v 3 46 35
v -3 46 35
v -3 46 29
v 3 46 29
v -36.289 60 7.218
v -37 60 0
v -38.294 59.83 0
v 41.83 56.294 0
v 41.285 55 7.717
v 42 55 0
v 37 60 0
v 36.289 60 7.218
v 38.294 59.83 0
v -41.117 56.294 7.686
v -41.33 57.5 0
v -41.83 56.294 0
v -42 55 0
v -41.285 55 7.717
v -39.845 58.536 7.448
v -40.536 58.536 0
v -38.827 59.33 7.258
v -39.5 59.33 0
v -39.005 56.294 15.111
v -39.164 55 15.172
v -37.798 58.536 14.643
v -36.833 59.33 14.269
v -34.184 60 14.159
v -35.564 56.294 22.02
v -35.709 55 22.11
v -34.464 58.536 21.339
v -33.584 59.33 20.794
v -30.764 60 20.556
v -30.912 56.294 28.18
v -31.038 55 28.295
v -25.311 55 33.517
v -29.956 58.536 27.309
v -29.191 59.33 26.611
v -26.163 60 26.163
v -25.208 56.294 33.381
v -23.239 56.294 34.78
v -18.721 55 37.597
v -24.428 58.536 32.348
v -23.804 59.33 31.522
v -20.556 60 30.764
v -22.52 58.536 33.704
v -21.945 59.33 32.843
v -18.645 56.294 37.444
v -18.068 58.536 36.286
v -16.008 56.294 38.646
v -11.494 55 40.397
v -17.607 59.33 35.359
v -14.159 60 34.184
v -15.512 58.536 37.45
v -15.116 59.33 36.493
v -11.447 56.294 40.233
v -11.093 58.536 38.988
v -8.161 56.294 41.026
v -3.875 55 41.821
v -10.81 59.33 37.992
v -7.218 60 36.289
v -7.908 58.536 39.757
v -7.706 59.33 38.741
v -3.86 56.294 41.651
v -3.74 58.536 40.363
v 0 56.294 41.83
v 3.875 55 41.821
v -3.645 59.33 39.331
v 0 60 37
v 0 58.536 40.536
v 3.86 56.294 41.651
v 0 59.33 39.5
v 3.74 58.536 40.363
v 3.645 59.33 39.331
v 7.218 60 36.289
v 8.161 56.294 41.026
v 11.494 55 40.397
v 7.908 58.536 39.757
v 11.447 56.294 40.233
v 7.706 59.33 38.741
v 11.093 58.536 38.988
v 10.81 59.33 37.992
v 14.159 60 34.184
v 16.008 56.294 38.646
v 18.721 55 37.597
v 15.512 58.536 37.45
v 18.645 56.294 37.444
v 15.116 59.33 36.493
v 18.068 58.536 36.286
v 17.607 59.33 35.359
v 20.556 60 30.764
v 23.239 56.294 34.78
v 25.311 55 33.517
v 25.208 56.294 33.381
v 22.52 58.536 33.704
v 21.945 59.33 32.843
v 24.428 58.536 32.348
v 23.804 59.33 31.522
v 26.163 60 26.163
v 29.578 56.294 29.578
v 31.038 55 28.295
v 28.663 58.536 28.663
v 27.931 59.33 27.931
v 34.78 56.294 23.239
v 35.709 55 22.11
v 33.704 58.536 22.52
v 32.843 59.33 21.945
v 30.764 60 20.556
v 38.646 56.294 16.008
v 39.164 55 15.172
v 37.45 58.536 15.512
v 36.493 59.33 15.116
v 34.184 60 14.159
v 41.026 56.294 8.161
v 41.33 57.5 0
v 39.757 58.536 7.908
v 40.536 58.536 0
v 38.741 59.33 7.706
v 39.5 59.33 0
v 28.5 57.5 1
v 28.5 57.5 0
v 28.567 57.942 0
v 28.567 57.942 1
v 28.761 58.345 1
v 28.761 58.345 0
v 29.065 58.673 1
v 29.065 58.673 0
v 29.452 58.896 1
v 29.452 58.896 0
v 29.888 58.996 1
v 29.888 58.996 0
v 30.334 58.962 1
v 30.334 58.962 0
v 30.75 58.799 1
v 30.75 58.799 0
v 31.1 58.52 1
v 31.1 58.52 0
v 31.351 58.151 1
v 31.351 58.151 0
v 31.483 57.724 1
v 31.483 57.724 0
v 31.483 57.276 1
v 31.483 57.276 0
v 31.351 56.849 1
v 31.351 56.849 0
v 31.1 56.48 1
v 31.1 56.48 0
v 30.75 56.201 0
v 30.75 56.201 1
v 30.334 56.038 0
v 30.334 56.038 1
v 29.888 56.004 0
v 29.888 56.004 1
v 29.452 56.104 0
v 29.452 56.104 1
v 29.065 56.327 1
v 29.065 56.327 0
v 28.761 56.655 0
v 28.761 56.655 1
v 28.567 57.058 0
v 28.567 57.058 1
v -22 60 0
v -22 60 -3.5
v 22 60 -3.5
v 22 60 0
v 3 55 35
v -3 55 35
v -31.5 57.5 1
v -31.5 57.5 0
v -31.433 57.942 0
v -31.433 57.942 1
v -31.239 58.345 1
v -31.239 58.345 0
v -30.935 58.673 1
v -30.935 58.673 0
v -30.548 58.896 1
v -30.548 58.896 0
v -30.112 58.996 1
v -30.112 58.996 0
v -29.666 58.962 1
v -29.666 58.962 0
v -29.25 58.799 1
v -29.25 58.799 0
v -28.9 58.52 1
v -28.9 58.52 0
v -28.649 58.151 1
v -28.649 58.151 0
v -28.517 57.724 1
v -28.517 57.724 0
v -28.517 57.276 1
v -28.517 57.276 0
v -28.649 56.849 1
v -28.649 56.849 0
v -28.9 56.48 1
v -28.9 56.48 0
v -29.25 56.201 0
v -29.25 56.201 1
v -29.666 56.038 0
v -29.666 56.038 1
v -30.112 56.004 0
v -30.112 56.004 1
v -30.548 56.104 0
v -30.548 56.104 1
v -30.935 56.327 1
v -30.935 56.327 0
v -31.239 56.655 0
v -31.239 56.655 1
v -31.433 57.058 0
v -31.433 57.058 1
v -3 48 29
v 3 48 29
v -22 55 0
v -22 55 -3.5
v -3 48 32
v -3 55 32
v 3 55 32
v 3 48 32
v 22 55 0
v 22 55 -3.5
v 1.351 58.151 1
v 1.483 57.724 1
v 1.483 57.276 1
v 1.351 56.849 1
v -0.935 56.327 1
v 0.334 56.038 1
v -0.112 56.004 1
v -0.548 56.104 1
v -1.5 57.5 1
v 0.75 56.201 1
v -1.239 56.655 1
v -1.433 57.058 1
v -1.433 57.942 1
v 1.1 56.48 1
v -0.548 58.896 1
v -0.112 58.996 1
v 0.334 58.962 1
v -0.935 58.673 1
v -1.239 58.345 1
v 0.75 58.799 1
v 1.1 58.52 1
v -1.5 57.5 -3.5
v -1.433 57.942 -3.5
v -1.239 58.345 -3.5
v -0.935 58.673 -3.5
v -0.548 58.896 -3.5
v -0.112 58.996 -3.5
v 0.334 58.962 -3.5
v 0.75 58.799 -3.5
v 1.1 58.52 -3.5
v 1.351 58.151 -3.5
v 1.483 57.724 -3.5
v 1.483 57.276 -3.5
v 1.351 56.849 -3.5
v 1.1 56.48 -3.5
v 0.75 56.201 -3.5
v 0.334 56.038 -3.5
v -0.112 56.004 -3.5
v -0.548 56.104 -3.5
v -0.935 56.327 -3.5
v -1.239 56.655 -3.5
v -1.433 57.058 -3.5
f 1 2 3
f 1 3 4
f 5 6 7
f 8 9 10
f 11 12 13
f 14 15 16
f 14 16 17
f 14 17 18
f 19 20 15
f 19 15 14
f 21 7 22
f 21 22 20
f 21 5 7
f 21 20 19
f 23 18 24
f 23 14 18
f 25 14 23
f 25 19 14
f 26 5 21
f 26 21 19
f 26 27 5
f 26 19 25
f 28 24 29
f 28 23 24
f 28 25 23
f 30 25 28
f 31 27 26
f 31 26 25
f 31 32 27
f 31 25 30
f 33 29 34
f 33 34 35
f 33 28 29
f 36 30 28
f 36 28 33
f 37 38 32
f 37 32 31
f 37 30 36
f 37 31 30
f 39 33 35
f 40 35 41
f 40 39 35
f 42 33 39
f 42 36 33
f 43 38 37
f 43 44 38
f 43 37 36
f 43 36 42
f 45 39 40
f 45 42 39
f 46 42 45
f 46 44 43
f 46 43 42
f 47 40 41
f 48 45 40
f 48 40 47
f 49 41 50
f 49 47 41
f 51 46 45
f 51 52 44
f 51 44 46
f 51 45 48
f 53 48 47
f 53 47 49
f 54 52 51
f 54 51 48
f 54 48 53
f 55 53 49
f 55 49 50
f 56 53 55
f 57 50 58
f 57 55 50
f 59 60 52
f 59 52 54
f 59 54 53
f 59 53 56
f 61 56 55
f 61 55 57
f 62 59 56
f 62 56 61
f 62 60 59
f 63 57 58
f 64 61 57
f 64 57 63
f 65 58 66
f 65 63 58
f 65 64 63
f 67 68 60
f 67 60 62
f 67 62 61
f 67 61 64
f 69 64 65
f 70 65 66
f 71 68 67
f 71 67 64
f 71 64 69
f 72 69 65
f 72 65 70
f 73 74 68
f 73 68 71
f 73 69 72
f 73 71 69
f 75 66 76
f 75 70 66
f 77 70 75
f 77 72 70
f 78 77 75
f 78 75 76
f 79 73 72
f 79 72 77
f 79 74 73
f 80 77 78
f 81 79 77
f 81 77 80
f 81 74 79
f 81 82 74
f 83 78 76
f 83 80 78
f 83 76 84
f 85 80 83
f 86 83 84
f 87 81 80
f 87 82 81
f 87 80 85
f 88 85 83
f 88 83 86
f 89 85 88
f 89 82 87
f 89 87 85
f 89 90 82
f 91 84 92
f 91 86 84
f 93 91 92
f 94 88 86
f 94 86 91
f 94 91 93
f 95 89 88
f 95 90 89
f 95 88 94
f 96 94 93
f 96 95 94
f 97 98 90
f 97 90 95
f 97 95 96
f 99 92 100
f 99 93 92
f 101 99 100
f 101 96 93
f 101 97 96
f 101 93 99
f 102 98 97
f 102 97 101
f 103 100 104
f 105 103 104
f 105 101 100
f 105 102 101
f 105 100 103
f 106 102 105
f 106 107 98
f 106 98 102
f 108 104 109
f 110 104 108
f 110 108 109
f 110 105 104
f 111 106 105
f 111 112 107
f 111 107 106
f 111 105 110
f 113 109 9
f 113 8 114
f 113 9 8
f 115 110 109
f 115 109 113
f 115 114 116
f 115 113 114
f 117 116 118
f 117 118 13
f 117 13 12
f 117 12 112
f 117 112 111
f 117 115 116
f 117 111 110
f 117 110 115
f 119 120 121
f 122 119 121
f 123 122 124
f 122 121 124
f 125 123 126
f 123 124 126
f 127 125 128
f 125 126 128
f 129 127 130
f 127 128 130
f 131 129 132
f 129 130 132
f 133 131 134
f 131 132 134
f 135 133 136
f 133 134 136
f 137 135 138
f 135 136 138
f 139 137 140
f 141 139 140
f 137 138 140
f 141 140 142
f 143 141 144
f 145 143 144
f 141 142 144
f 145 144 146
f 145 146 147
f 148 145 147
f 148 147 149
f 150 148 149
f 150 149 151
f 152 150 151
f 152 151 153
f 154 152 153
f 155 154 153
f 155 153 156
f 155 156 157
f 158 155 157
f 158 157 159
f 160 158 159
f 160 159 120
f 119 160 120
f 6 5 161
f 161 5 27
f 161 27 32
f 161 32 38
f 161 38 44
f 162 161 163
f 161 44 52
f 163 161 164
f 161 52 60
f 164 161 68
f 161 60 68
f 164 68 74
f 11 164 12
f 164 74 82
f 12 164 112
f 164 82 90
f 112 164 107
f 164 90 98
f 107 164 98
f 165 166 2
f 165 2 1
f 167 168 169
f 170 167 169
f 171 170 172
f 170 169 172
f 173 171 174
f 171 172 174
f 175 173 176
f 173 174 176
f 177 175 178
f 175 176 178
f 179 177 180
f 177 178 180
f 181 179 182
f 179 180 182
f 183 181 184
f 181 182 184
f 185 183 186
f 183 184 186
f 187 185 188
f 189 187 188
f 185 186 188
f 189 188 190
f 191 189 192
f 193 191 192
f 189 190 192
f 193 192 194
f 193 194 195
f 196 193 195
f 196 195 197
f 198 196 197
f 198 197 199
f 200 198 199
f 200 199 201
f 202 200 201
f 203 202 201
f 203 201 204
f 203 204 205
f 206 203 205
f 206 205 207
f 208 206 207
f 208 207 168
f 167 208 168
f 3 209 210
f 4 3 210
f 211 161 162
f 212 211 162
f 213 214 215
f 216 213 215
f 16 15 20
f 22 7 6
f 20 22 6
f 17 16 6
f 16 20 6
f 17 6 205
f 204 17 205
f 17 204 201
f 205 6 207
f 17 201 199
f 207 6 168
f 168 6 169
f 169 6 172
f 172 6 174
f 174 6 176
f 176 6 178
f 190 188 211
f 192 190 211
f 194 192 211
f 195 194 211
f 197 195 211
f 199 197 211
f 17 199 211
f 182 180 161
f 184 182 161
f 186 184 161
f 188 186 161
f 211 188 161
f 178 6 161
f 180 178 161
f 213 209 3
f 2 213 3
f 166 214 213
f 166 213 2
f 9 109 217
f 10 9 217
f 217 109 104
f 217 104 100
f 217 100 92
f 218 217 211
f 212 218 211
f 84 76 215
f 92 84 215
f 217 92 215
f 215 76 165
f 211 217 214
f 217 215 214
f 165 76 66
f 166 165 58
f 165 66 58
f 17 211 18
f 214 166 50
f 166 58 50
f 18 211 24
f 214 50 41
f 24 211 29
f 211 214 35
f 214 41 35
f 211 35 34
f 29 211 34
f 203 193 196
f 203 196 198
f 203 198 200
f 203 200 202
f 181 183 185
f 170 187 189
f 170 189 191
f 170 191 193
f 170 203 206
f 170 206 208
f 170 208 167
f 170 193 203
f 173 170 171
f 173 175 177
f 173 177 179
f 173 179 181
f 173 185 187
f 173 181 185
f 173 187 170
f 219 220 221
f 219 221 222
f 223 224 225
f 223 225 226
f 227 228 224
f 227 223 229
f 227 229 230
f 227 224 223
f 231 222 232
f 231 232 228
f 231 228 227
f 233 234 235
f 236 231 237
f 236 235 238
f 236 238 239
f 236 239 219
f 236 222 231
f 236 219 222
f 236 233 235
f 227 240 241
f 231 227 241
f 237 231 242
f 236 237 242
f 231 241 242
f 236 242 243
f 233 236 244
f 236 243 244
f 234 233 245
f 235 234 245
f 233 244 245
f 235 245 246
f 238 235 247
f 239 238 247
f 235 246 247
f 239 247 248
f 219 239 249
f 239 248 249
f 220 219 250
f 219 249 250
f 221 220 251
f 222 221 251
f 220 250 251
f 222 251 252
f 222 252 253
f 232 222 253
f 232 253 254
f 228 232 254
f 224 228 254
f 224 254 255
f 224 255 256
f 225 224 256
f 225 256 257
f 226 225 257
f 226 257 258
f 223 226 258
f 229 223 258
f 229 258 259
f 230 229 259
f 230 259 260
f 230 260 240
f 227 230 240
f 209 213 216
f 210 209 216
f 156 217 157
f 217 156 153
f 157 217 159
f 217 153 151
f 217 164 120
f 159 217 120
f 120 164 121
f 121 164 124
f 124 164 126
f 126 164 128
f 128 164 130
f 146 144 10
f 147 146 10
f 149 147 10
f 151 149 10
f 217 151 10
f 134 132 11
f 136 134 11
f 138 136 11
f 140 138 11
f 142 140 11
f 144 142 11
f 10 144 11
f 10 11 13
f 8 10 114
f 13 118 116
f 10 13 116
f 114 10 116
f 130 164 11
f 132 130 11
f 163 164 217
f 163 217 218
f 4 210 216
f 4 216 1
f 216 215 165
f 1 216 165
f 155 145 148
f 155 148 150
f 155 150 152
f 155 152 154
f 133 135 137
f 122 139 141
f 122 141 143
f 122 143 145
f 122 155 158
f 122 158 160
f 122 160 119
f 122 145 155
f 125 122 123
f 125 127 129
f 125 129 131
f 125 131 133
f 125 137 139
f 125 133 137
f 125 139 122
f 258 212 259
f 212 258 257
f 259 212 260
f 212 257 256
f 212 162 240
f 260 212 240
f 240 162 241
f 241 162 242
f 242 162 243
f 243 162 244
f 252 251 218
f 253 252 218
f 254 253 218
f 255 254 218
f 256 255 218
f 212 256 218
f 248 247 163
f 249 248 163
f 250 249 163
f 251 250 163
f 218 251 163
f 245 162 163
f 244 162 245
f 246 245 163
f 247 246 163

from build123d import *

# Parameters (mm, degrees)
CUT_EXTRUDE1_DEPTH       = 5
CUT_EXTRUDE3_DEPTH       = 45
SKETCH8_R                = 40
CUT_EXTRUDE4_DEPTH       = 32
SKETCH9_R                = 32
SKETCH9_R_2              = 24.5
CUT_EXTRUDE5_DEPTH       = 14
SKETCH10_R               = 26
CUT_EXTRUDE6_DEPTH       = 14
FILLET1_R                = 7
FILLET2_R                = 7
CUT_REVOLVE1_START       = 22
CUT_REVOLVE1_DEPTH       = 30.5
CUT_EXTRUDE12_DEPTH      = 5
SKETCH18_W               = 13
SKETCH18_H               = 8
CUT_EXTRUDE13_DEPTH      = 5
INTERSECT1_OUTLINE_R     = 42
INTERSECT1_DEPTH         = 55
SKETCH20_W               = 6
SKETCH20_H               = 3
BOSS_EXTRUDE1_DEPTH      = 8
BOSS_EXTRUDE2_DEPTH      = 1
BOSS_EXTRUDE2_DEPTH_BACK = 1
SKETCH21_W               = 6
SKETCH21_H               = 6
BOSS_EXTRUDE3_DEPTH      = 7
SKETCH19_R               = 1.5
CUT_EXTRUDE14_DEPTH      = 8
SKETCH23_W               = 20
SKETCH23_H               = 7
CUT_EXTRUDE15_DEPTH      = 7
SKETCH24_W               = 44
SKETCH24_H               = 3.5
CUT_EXTRUDE16_DEPTH      = 5


# Read off the part's stored shape, not the designer's step: Cut-Revolve1, Intersect1
with BuildPart() as part:
    # Sketch1 → Revolve1 (revolve)
    with BuildSketch(Plane.XY, mode=Mode.PRIVATE) as revolve1_sk:
        with BuildLine():
            Line((22.5, 0), (32, 0))
            ThreePointArc((32, 0), (33.414213562, 0.585786438), (34, 2))
            Line((34, 2), (34, 18))
            Line((34, 18), (40, 18))
            ThreePointArc((40, 18), (41.414213562, 18.585786438), (42, 20))
            Line((42, 20), (42, 55))
            ThreePointArc((42, 55), (40.535533906, 58.535533906), (37, 60))
            Line((37, 60), (0, 60))
            Line((0, 60), (0, 18))
            Line((0, 18), (22.5, 18))
            Line((22.5, 18), (22.5, 0))
        make_face()
    revolve(revolve1_sk.sketch.rotate(Axis((0, 2, 0), (0, 1, 0)), 90), axis=Axis((0, 2, 0), (0, 1, 0)))

    # Sketch5 → Cut-Extrude1 (cut)
    with BuildSketch(Plane(origin=(0, 60, 0), x_dir=(1, 0, 0), z_dir=(0, 1, 0))):
        with BuildLine():
            Line((-42, 0), (-40, 0))
            Line((-40, 0), (40, 0))
            Line((40, 0), (42, 0))
            ThreePointArc((42, 0), (0, 42), (-42, 0))
        make_face()
    extrude(amount=-CUT_EXTRUDE1_DEPTH, mode=Mode.SUBTRACT)

    # Sketch7 → Cut-Extrude3 (cut)
    with BuildSketch(Plane.XZ.offset(-18)):
        with BuildLine():
            Line((-21, 0), (21, 0))
            ThreePointArc((21, 0), (0, -21), (-21, 0))
        make_face()
    extrude(amount=-CUT_EXTRUDE3_DEPTH, mode=Mode.SUBTRACT)

    # Sketch8 → Cut-Extrude4 (cut)
    with BuildSketch(Plane(origin=(0, 52.5, 0), x_dir=(1, 0, 0), z_dir=(0, 1, 0))):
        with Locations(Location((0, 0, 0), (0, 0, 270))):
            Circle(SKETCH8_R)
        with BuildLine():
            Line((22.912878475, -2), (-22.912878475, -2))
            ThreePointArc((-22.912878475, -2), (0, 23), (22.912878475, -2))
        make_face(mode=Mode.SUBTRACT)
    extrude(amount=-CUT_EXTRUDE4_DEPTH, mode=Mode.SUBTRACT)

    # Sketch9 → Cut-Extrude5 (cut)
    with BuildSketch(Plane(origin=(0, 2, 0), x_dir=(-1, 0, 0), z_dir=(0, -1, 0))):
        with Locations(Location((0, 0, 0), (0, 0, 90))):
            Circle(SKETCH9_R)
        with Locations(Location((0, 0, 0), (0, 0, 90))):
            Circle(SKETCH9_R_2, mode=Mode.SUBTRACT)
    extrude(amount=-CUT_EXTRUDE5_DEPTH, mode=Mode.SUBTRACT)

    # Sketch10 → Cut-Extrude6 (cut)
    with BuildSketch(Plane(origin=(0, 2, 0), x_dir=(-1, 0, 0), z_dir=(0, -1, 0))):
        Circle(SKETCH10_R)
    extrude(amount=-CUT_EXTRUDE6_DEPTH, mode=Mode.SUBTRACT)

    # Fillet1
    fillet1_edges = [part.edges().sort_by_distance(p)[0] for p in [
        (21, 36.5, 0),
        (-21, 36.5, 0),
    ]]
    fillet(fillet1_edges, radius=FILLET1_R)

    # Fillet2
    fillet2_edges = [part.edges().sort_by_distance(p)[0] for p in [
        (-22.912878475, 36.5, 2),
        (22.912878475, 36.5, 2),
    ]]
    fillet(fillet2_edges, radius=FILLET2_R)

    # Cut-Revolve1 outline → Cut-Revolve1 (cut)
    with BuildSketch(Plane(origin=(0, 0, 0), x_dir=(1, 0, 0), z_dir=(0, 1, 0)).offset(CUT_REVOLVE1_START)):
        with BuildLine():
            Line((-34.641016151, -20), (-36.373066959, -21))
            ThreePointArc((-36.373066959, -21), (0, -42), (36.373066959, -21))
            Line((36.373066959, -21), (34.641016151, -20))
            ThreePointArc((34.641016151, -20), (0, -40), (-34.641016151, -20))
        make_face()
    extrude(amount=CUT_REVOLVE1_DEPTH, mode=Mode.SUBTRACT)

    # Sketch15 → Cut-Extrude12 (cut)
    with BuildSketch(Plane(origin=(0, 20.5, 0), x_dir=(1, 0, 0), z_dir=(0, 1, 0))):
        with BuildLine():
            Line((-28.124355653, -3.514579578), (-26.124355653, -3.514579578))
            ThreePointArc((-26.124355653, -3.514579578), (-24.710142091, -2.928793141), (-24.124355653, -1.514579578))
            Line((-24.124355653, -1.514579578), (-24.124355653, 8.485420422))
            ThreePointArc((-24.124355653, 8.485420422), (-24.710142091, 9.899633984), (-26.124355653, 10.485420422))
            Line((-26.124355653, 10.485420422), (-28.124355653, 10.485420422))
            ThreePointArc((-28.124355653, 10.485420422), (-29.538569215, 9.899633984), (-30.124355653, 8.485420422))
            Line((-30.124355653, 8.485420422), (-30.124355653, -1.514579578))
            ThreePointArc((-30.124355653, -1.514579578), (-29.538569215, -2.928793141), (-28.124355653, -3.514579578))
        make_face()
    extrude(amount=-CUT_EXTRUDE12_DEPTH, mode=Mode.SUBTRACT)

    # Sketch18 → Cut-Extrude13 (cut)
    with BuildSketch(Plane(origin=(0, 55, 0), x_dir=(1, 0, 0), z_dir=(0, 1, 0))):
        with Locations((0.796512215, 32.951769165)):
            Rectangle(SKETCH18_W, SKETCH18_H)
    extrude(amount=-CUT_EXTRUDE13_DEPTH, mode=Mode.SUBTRACT)

    # Intersect1 outline → Intersect1 (cut)
    with BuildSketch(Plane(origin=(0, 0, 0), x_dir=(1, 0, 0), z_dir=(0, 1, 0))):
        Circle(INTERSECT1_OUTLINE_R)
        with BuildLine():
            Line((12.124355653, 0), (-12.124355653, 0))
            ThreePointArc((-12.124355653, 0), (-18.186533479, 3.5), (-18.186533479, 10.5))
            ThreePointArc((-18.186533479, 10.5), (0, 21), (18.186533479, 10.5))
            ThreePointArc((18.186533479, 10.5), (18.186533479, 3.5), (12.124355653, 0))
        make_face(mode=Mode.SUBTRACT)
    extrude(amount=INTERSECT1_DEPTH, mode=Mode.SUBTRACT)

    # Sketch20 → Boss-Extrude1 (add)
    with BuildSketch(Plane.XZ.offset(-55)):
        with Locations((0, 33.5)):
            Rectangle(SKETCH20_W, SKETCH20_H)
    extrude(amount=BOSS_EXTRUDE1_DEPTH)

    # Sketch21 → Boss-Extrude2 (add, two sides: drawn at the far end of the back side and taken through both)
    with BuildSketch(Plane.XZ.offset(-47).offset(-BOSS_EXTRUDE2_DEPTH_BACK)):
        with Locations((0, 32)):
            Rectangle(SKETCH21_W, SKETCH21_H)
    extrude(amount=BOSS_EXTRUDE2_DEPTH + BOSS_EXTRUDE2_DEPTH_BACK)

    # Sketch22 → Boss-Extrude3 (add)
    with BuildSketch(Plane(origin=(0, 0, 0), x_dir=(-1, 0, 0), z_dir=(0, 0, -1))):
        with BuildLine():
            Line((-42, 55), (42, 55))
            ThreePointArc((42, 55), (40.535533906, 58.535533906), (37, 60))
            Line((37, 60), (-37, 60))
            ThreePointArc((-37, 60), (-40.535533906, 58.535533906), (-42, 55))
        make_face()
    extrude(amount=BOSS_EXTRUDE3_DEPTH)

    # Sketch19 → Cut-Extrude14 (cut)
    with BuildSketch(Plane(origin=(0, 0, -7), x_dir=(-1, 0, 0), z_dir=(0, 0, -1))):
        with Locations((0, 57.5)):
            Circle(SKETCH19_R)
        with Locations((-30, 57.5)):
            Circle(SKETCH19_R)
        with Locations((30, 57.5)):
            Circle(SKETCH19_R)
    extrude(amount=-CUT_EXTRUDE14_DEPTH, mode=Mode.SUBTRACT)

    # Sketch23 → Cut-Extrude15 (cut)
    with BuildSketch(Plane(origin=(0, 60, 0), x_dir=(1, 0, 0), z_dir=(0, 1, 0))):
        with Locations((-32, 3.5)):
            Rectangle(SKETCH23_W, SKETCH23_H)
        with Locations((32, 3.5)):
            Rectangle(SKETCH23_W, SKETCH23_H)
    extrude(amount=-CUT_EXTRUDE15_DEPTH, mode=Mode.SUBTRACT)

    # Sketch24 → Cut-Extrude16 (cut)
    with BuildSketch(Plane(origin=(0, 60, 0), x_dir=(1, 0, 0), z_dir=(0, 1, 0))):
        with Locations((0, 5.25)):
            Rectangle(SKETCH24_W, SKETCH24_H)
    extrude(amount=-CUT_EXTRUDE16_DEPTH, mode=Mode.SUBTRACT)


solid = part.part
